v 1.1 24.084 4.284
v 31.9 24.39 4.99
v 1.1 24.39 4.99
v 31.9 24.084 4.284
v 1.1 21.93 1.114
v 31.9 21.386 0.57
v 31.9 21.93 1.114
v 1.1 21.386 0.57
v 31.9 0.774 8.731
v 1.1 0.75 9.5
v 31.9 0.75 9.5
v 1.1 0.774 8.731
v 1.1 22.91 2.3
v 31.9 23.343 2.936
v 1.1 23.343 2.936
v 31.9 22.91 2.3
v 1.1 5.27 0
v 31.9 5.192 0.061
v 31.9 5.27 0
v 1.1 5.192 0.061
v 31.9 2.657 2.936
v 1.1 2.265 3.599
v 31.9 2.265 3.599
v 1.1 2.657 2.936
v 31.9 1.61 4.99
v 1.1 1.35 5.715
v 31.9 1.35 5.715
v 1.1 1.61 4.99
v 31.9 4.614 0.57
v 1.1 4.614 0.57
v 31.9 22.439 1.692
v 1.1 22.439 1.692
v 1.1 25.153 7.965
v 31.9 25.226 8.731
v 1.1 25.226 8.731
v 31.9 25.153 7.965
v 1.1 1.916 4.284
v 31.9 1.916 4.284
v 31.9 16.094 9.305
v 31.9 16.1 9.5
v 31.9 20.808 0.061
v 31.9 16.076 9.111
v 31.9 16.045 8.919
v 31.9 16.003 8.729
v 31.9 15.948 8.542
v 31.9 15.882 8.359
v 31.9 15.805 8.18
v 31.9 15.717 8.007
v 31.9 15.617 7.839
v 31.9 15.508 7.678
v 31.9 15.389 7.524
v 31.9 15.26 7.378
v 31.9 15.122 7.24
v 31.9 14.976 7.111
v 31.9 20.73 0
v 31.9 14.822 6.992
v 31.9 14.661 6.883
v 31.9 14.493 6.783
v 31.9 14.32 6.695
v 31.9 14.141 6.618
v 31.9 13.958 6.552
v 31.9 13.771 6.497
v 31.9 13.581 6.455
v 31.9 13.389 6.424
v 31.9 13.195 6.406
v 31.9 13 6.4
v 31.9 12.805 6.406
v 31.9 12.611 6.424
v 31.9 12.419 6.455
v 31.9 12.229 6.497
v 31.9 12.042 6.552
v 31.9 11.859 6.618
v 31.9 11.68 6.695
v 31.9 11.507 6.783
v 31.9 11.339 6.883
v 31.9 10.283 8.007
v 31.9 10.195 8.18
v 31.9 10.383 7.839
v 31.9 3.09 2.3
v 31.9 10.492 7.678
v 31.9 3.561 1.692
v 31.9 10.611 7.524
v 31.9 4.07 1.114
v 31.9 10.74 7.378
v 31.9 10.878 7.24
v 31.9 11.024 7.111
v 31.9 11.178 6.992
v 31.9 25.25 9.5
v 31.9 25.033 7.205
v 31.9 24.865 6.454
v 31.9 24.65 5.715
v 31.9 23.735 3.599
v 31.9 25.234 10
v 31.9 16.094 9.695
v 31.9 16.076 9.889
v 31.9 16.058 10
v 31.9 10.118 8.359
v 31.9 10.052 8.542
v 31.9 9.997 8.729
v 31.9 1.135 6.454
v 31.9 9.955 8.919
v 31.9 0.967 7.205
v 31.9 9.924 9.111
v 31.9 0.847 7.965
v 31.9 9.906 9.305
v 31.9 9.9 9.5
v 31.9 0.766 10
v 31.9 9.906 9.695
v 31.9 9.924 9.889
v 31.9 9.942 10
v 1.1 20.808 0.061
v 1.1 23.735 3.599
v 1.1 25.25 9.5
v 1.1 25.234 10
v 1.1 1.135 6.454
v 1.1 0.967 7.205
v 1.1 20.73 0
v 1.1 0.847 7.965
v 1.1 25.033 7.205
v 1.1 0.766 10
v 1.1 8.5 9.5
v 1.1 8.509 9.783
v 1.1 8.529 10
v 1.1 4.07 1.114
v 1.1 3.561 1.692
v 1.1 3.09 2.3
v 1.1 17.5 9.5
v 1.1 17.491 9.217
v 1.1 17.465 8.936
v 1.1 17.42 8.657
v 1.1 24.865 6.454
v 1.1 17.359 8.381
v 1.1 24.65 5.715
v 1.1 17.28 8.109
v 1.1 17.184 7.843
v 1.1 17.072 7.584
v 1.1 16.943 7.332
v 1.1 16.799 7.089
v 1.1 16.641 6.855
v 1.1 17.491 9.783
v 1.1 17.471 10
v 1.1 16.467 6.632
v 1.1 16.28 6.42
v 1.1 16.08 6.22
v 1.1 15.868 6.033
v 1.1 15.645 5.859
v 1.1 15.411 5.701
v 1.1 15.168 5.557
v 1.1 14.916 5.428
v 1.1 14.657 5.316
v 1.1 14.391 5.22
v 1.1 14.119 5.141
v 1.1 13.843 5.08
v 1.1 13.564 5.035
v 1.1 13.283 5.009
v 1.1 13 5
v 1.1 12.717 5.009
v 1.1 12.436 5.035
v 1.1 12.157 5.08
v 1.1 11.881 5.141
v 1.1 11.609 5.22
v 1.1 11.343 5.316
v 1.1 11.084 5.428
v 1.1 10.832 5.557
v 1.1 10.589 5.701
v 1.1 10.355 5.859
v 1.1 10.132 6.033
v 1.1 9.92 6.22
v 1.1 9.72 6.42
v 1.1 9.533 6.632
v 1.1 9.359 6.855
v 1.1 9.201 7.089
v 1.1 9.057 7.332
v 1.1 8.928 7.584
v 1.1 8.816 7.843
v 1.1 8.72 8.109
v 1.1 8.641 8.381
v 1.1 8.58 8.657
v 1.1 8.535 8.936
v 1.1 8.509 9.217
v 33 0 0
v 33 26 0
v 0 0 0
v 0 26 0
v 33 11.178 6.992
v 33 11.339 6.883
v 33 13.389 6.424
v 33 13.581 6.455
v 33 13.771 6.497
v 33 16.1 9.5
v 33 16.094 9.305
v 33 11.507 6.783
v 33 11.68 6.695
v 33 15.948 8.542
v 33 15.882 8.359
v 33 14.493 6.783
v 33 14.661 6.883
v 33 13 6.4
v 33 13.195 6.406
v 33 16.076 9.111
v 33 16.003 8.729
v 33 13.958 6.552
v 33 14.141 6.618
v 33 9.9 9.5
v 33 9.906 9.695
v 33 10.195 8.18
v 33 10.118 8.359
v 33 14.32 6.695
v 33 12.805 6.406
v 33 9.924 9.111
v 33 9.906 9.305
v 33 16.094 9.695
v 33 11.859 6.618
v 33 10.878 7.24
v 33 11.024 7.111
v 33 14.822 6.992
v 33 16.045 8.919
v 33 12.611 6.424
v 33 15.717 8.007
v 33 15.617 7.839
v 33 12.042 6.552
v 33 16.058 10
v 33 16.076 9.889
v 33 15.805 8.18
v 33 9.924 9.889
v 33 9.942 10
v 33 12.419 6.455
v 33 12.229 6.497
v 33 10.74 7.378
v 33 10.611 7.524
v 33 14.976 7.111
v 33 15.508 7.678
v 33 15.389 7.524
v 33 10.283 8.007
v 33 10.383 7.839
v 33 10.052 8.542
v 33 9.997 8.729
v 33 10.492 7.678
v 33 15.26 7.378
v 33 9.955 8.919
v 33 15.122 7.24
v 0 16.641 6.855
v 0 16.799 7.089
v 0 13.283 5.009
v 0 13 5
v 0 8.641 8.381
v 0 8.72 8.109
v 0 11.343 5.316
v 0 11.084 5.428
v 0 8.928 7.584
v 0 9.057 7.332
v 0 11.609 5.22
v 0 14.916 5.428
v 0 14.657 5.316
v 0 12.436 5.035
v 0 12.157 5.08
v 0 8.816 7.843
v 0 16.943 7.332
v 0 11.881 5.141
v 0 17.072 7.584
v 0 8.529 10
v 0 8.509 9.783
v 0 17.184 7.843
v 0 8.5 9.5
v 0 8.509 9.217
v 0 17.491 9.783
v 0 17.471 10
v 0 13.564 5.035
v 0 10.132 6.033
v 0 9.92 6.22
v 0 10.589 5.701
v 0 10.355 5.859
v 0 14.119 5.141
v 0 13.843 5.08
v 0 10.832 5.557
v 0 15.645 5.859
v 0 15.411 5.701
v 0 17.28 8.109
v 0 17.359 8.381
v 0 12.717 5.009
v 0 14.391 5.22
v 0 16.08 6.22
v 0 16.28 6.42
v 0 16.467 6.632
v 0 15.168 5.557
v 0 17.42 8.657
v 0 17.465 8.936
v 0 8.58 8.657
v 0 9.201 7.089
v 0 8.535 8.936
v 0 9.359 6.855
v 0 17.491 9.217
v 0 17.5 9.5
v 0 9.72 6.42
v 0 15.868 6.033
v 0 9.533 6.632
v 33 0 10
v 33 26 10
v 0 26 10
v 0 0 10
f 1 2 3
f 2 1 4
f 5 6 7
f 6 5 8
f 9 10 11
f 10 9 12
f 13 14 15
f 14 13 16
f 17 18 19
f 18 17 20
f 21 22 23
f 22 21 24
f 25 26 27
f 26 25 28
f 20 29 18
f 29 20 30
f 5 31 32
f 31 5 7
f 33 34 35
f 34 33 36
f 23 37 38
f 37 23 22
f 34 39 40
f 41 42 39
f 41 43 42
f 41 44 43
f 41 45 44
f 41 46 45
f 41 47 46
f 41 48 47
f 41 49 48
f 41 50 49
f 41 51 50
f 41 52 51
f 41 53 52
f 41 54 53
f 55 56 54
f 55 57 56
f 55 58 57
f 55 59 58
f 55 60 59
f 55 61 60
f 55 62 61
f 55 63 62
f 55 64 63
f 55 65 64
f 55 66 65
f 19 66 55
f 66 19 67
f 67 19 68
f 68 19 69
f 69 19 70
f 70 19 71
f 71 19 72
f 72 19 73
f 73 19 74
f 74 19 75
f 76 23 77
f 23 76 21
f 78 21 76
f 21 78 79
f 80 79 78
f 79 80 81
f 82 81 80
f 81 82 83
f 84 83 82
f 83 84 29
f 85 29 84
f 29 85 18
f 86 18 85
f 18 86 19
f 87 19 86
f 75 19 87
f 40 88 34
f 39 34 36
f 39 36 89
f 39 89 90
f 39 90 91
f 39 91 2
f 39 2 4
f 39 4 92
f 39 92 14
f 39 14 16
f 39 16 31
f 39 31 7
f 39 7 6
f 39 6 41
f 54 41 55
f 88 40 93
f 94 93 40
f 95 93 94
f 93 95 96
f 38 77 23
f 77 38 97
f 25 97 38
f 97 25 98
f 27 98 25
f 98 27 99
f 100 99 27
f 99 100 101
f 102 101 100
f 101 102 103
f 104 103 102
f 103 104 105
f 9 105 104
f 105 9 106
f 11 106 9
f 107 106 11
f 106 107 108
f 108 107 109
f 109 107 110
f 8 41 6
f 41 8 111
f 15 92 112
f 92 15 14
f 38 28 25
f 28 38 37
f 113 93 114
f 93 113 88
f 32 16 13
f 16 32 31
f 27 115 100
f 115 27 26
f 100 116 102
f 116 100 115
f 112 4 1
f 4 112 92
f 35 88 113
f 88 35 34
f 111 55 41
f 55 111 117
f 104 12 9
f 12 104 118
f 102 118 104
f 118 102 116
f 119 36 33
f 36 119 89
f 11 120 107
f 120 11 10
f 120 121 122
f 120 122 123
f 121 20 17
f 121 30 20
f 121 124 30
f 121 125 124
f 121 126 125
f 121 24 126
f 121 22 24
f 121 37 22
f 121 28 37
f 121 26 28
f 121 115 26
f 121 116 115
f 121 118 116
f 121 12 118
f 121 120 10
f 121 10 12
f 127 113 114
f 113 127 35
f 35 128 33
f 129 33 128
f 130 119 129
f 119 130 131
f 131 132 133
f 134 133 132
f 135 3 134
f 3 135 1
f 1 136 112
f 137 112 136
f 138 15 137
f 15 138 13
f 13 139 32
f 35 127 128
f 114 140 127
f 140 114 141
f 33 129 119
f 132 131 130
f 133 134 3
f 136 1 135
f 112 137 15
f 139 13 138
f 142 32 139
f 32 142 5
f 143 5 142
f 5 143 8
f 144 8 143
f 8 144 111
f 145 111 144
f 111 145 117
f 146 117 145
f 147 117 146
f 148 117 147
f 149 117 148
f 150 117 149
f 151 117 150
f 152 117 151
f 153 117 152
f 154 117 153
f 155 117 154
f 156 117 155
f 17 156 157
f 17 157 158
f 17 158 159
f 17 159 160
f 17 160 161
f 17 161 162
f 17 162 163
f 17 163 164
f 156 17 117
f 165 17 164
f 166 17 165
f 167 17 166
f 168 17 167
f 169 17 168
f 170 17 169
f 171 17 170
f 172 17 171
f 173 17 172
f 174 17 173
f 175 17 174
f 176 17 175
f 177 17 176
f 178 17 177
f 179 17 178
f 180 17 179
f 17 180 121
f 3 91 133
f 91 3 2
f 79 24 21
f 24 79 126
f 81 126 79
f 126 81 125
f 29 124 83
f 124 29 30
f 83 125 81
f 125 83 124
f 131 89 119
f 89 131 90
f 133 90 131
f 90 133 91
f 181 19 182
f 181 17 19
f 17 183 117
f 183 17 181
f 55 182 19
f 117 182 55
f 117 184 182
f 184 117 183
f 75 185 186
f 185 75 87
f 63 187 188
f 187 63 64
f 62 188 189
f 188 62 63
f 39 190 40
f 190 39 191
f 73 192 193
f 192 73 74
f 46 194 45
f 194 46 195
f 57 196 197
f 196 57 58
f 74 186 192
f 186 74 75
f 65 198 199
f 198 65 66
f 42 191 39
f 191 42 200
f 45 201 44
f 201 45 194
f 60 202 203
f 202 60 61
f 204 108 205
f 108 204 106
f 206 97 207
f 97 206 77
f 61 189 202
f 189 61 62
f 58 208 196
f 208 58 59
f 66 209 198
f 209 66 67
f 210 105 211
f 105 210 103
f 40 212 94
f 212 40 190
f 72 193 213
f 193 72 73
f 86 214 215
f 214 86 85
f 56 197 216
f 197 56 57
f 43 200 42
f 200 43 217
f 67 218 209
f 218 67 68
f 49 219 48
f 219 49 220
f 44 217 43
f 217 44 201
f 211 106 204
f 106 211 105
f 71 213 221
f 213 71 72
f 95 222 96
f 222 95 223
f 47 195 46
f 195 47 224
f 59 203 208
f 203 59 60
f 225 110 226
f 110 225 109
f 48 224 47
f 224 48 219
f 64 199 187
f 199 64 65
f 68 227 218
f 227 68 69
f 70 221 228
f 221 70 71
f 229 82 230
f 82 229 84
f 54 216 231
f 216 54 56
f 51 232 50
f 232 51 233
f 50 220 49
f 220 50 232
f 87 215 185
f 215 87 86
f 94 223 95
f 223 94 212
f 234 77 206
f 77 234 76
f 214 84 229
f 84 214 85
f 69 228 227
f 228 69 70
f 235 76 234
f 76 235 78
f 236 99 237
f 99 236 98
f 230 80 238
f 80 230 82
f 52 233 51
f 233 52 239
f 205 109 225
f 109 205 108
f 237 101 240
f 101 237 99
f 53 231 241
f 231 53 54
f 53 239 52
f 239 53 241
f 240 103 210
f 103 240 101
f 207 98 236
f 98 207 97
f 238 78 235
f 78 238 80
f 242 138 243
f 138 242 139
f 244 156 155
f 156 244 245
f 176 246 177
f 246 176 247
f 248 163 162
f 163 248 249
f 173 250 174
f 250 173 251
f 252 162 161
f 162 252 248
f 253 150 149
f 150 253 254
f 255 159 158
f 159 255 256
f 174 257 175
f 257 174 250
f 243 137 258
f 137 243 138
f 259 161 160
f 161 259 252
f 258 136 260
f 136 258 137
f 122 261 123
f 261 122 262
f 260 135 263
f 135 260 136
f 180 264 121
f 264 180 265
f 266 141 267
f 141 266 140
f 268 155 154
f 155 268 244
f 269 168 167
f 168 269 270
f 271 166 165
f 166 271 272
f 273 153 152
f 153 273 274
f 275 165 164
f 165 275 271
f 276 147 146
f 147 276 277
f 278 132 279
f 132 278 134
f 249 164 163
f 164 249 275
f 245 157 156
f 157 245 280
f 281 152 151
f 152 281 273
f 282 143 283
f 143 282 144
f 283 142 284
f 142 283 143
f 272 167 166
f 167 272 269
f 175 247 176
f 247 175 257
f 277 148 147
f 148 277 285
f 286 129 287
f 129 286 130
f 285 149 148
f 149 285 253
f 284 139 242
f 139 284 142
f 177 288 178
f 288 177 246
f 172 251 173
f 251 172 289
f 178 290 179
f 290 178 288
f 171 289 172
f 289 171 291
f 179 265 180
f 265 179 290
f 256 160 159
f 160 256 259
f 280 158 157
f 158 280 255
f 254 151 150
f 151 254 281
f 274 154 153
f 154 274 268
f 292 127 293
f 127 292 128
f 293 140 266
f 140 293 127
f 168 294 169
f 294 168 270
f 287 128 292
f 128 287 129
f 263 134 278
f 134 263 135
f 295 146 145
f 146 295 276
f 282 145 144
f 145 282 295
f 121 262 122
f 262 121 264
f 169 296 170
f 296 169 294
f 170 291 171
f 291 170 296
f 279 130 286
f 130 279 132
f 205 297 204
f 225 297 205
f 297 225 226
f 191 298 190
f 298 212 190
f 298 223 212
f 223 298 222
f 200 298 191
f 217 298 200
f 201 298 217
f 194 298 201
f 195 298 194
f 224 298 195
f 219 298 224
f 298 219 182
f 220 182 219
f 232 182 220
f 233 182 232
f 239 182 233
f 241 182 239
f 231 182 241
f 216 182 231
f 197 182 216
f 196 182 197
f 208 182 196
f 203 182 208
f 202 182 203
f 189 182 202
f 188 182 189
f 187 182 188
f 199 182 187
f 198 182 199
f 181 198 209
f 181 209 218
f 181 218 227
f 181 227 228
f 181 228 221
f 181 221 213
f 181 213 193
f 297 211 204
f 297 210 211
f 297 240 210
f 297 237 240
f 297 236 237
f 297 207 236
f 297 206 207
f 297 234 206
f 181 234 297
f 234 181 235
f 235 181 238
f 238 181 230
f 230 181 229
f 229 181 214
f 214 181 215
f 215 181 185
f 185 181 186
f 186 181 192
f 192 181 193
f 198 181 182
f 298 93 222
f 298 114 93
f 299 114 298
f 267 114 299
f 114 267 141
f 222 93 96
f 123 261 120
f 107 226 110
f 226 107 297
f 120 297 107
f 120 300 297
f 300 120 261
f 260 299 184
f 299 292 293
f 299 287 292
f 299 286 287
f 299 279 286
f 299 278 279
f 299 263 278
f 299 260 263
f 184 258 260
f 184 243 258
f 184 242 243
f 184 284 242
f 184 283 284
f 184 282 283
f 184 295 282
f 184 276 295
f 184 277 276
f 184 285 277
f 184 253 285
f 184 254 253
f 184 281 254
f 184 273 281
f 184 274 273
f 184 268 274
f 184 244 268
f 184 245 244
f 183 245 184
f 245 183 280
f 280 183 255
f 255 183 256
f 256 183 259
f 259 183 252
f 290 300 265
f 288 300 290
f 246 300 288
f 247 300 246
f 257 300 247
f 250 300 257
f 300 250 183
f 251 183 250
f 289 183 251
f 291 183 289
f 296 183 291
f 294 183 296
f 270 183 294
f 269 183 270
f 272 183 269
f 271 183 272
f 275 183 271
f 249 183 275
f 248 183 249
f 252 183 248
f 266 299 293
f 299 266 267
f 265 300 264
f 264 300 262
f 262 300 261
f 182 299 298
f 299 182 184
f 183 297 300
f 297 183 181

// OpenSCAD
// file: JohnsonNF243G-20242.scad
/*
	Openscad modell for Johnson NF243G-20242 Motor

	2015 by ChrisMicro

*/

$fn=100; // resolution
manuFactoringOffset=0.5;

motorDiameter   = manuFactoringOffset+24;
motorHeight     = manuFactoringOffset+18.5;
motorBodyLength = manuFactoringOffset+30.3;

axisLength      = 20;
axisTotalLength = 55;
axisDiameter    = 2;

frontRingDiameter = 6.2;
frontRingLength   = 1.2;

backRingDiameter  = manuFactoringOffset+8.5;
backRingLength    = manuFactoringOffset+1.7+.5;

ringInlayOffset=2; // this is only to prevent rendering errors
 
motor();

function get_motorDiameter()=motorDiameter;
function get_motorHeight()=motorHeight;

axisShift=axisTotalLength-(motorBodyLength+frontRingLength+axisLength);


module motor()
{
	// front ring
	translate([motorBodyLength/2-ringInlayOffset,0,0]) rotate([0,90,0])	
		cylinder(h = frontRingLength+ringInlayOffset, r = frontRingDiameter/2, center = false);

	// back ring
	translate([-motorBodyLength/2-backRingLength,0,0]) rotate([0,90,0])	
		cylinder(h = backRingLength+ringInlayOffset, r = backRingDiameter/2, center = false);

	// axis
	color("grey") translate([-motorBodyLength/2-axisShift,0,0]) rotate([0,90,0])	
		cylinder(h = axisTotalLength, r = axisDiameter/2, center = false);

	// body
	color("grey") intersection()
	{
		translate([-motorBodyLength/2,0,0]) rotate([0,90,0])	
			cylinder(h = motorBodyLength, r = motorDiameter/2, center = false);
			cube(size = [motorBodyLength,motorDiameter,motorHeight], center = true);
	}
}
// main file
/*
	motor holder for JohnsonNF243G-20242 motor
	2015 by ChrisMicro
*/

$fn=100;

use <JohnsonNF243G-20242.scad>

MotorholderLength = 33;
MotorholderHeight = 10;
MotorHolderWitdh  = 26;

basePlateLength   = MotorholderLength;
basePlateWidth    = 40;
basePlateHeight   = 3;


drilldiameter = 3.3/2;
drillPositionBorderDistance = 5 ;

motorDiameter   = get_motorDiameter();
motorHeight     = get_motorHeight();

motorHolder();


basePlateOffset=-MotorholderHeight/2-basePlateHeight/2;

// drilling coordinates
x0=basePlateLength/2-drillPositionBorderDistance;
y0=MotorHolderWitdh-drillPositionBorderDistance-drilldiameter*2;

x1=-basePlateLength/2+drillPositionBorderDistance;
y1=(MotorHolderWitdh-drillPositionBorderDistance-drilldiameter*2);

x2=-basePlateLength/2+drillPositionBorderDistance;
y2=-(MotorHolderWitdh-drillPositionBorderDistance-drilldiameter*2);

x3=basePlateLength/2-drillPositionBorderDistance;
y3=-(MotorHolderWitdh-drillPositionBorderDistance-drilldiameter*2);

module motorHolderbasePlate()
{
	difference()
	{
		// baseplate
		color("silver") translate([0,0,basePlateOffset]) 		
			cube(size = [basePlateLength,basePlateWidth,basePlateHeight], center = true);

		// baseplate drillings
		union()
		{
			// drill 0
			translate([x0,y0,basePlateOffset-basePlateHeight/2]) 		
				cylinder(basePlateHeight,drilldiameter,drilldiameter);

			// drill 1
			translate([x1,y1,basePlateOffset-basePlateHeight/2]) 		
				cylinder(basePlateHeight,drilldiameter,drilldiameter);

			// drill 2
			translate([x2,y2,basePlateOffset-basePlateHeight/2]) 		
				cylinder(basePlateHeight,drilldiameter,drilldiameter);

			// drill 3
			translate([x3,y3,basePlateOffset-basePlateHeight/2]) 		
				cylinder(basePlateHeight,drilldiameter,drilldiameter);
		}
	}
}
	
//basePlate();

module motorHolder()
{
	//translate([basePlateLength/2,basePlateWidth/2,MotorholderHeight/2+basePlateHeight])
	translate([basePlateLength/2,MotorHolderWitdh/2,MotorholderHeight/2])

	union()
	{	
		//motorHolderbasePlate();
		
		// motor holder main
		difference()
		{
			cube(size = [MotorholderLength,MotorHolderWitdh,MotorholderHeight], center = true);
			translate([0,0,motorHeight/2-MotorholderHeight/2]) 
				motor();
		}
	}
}
